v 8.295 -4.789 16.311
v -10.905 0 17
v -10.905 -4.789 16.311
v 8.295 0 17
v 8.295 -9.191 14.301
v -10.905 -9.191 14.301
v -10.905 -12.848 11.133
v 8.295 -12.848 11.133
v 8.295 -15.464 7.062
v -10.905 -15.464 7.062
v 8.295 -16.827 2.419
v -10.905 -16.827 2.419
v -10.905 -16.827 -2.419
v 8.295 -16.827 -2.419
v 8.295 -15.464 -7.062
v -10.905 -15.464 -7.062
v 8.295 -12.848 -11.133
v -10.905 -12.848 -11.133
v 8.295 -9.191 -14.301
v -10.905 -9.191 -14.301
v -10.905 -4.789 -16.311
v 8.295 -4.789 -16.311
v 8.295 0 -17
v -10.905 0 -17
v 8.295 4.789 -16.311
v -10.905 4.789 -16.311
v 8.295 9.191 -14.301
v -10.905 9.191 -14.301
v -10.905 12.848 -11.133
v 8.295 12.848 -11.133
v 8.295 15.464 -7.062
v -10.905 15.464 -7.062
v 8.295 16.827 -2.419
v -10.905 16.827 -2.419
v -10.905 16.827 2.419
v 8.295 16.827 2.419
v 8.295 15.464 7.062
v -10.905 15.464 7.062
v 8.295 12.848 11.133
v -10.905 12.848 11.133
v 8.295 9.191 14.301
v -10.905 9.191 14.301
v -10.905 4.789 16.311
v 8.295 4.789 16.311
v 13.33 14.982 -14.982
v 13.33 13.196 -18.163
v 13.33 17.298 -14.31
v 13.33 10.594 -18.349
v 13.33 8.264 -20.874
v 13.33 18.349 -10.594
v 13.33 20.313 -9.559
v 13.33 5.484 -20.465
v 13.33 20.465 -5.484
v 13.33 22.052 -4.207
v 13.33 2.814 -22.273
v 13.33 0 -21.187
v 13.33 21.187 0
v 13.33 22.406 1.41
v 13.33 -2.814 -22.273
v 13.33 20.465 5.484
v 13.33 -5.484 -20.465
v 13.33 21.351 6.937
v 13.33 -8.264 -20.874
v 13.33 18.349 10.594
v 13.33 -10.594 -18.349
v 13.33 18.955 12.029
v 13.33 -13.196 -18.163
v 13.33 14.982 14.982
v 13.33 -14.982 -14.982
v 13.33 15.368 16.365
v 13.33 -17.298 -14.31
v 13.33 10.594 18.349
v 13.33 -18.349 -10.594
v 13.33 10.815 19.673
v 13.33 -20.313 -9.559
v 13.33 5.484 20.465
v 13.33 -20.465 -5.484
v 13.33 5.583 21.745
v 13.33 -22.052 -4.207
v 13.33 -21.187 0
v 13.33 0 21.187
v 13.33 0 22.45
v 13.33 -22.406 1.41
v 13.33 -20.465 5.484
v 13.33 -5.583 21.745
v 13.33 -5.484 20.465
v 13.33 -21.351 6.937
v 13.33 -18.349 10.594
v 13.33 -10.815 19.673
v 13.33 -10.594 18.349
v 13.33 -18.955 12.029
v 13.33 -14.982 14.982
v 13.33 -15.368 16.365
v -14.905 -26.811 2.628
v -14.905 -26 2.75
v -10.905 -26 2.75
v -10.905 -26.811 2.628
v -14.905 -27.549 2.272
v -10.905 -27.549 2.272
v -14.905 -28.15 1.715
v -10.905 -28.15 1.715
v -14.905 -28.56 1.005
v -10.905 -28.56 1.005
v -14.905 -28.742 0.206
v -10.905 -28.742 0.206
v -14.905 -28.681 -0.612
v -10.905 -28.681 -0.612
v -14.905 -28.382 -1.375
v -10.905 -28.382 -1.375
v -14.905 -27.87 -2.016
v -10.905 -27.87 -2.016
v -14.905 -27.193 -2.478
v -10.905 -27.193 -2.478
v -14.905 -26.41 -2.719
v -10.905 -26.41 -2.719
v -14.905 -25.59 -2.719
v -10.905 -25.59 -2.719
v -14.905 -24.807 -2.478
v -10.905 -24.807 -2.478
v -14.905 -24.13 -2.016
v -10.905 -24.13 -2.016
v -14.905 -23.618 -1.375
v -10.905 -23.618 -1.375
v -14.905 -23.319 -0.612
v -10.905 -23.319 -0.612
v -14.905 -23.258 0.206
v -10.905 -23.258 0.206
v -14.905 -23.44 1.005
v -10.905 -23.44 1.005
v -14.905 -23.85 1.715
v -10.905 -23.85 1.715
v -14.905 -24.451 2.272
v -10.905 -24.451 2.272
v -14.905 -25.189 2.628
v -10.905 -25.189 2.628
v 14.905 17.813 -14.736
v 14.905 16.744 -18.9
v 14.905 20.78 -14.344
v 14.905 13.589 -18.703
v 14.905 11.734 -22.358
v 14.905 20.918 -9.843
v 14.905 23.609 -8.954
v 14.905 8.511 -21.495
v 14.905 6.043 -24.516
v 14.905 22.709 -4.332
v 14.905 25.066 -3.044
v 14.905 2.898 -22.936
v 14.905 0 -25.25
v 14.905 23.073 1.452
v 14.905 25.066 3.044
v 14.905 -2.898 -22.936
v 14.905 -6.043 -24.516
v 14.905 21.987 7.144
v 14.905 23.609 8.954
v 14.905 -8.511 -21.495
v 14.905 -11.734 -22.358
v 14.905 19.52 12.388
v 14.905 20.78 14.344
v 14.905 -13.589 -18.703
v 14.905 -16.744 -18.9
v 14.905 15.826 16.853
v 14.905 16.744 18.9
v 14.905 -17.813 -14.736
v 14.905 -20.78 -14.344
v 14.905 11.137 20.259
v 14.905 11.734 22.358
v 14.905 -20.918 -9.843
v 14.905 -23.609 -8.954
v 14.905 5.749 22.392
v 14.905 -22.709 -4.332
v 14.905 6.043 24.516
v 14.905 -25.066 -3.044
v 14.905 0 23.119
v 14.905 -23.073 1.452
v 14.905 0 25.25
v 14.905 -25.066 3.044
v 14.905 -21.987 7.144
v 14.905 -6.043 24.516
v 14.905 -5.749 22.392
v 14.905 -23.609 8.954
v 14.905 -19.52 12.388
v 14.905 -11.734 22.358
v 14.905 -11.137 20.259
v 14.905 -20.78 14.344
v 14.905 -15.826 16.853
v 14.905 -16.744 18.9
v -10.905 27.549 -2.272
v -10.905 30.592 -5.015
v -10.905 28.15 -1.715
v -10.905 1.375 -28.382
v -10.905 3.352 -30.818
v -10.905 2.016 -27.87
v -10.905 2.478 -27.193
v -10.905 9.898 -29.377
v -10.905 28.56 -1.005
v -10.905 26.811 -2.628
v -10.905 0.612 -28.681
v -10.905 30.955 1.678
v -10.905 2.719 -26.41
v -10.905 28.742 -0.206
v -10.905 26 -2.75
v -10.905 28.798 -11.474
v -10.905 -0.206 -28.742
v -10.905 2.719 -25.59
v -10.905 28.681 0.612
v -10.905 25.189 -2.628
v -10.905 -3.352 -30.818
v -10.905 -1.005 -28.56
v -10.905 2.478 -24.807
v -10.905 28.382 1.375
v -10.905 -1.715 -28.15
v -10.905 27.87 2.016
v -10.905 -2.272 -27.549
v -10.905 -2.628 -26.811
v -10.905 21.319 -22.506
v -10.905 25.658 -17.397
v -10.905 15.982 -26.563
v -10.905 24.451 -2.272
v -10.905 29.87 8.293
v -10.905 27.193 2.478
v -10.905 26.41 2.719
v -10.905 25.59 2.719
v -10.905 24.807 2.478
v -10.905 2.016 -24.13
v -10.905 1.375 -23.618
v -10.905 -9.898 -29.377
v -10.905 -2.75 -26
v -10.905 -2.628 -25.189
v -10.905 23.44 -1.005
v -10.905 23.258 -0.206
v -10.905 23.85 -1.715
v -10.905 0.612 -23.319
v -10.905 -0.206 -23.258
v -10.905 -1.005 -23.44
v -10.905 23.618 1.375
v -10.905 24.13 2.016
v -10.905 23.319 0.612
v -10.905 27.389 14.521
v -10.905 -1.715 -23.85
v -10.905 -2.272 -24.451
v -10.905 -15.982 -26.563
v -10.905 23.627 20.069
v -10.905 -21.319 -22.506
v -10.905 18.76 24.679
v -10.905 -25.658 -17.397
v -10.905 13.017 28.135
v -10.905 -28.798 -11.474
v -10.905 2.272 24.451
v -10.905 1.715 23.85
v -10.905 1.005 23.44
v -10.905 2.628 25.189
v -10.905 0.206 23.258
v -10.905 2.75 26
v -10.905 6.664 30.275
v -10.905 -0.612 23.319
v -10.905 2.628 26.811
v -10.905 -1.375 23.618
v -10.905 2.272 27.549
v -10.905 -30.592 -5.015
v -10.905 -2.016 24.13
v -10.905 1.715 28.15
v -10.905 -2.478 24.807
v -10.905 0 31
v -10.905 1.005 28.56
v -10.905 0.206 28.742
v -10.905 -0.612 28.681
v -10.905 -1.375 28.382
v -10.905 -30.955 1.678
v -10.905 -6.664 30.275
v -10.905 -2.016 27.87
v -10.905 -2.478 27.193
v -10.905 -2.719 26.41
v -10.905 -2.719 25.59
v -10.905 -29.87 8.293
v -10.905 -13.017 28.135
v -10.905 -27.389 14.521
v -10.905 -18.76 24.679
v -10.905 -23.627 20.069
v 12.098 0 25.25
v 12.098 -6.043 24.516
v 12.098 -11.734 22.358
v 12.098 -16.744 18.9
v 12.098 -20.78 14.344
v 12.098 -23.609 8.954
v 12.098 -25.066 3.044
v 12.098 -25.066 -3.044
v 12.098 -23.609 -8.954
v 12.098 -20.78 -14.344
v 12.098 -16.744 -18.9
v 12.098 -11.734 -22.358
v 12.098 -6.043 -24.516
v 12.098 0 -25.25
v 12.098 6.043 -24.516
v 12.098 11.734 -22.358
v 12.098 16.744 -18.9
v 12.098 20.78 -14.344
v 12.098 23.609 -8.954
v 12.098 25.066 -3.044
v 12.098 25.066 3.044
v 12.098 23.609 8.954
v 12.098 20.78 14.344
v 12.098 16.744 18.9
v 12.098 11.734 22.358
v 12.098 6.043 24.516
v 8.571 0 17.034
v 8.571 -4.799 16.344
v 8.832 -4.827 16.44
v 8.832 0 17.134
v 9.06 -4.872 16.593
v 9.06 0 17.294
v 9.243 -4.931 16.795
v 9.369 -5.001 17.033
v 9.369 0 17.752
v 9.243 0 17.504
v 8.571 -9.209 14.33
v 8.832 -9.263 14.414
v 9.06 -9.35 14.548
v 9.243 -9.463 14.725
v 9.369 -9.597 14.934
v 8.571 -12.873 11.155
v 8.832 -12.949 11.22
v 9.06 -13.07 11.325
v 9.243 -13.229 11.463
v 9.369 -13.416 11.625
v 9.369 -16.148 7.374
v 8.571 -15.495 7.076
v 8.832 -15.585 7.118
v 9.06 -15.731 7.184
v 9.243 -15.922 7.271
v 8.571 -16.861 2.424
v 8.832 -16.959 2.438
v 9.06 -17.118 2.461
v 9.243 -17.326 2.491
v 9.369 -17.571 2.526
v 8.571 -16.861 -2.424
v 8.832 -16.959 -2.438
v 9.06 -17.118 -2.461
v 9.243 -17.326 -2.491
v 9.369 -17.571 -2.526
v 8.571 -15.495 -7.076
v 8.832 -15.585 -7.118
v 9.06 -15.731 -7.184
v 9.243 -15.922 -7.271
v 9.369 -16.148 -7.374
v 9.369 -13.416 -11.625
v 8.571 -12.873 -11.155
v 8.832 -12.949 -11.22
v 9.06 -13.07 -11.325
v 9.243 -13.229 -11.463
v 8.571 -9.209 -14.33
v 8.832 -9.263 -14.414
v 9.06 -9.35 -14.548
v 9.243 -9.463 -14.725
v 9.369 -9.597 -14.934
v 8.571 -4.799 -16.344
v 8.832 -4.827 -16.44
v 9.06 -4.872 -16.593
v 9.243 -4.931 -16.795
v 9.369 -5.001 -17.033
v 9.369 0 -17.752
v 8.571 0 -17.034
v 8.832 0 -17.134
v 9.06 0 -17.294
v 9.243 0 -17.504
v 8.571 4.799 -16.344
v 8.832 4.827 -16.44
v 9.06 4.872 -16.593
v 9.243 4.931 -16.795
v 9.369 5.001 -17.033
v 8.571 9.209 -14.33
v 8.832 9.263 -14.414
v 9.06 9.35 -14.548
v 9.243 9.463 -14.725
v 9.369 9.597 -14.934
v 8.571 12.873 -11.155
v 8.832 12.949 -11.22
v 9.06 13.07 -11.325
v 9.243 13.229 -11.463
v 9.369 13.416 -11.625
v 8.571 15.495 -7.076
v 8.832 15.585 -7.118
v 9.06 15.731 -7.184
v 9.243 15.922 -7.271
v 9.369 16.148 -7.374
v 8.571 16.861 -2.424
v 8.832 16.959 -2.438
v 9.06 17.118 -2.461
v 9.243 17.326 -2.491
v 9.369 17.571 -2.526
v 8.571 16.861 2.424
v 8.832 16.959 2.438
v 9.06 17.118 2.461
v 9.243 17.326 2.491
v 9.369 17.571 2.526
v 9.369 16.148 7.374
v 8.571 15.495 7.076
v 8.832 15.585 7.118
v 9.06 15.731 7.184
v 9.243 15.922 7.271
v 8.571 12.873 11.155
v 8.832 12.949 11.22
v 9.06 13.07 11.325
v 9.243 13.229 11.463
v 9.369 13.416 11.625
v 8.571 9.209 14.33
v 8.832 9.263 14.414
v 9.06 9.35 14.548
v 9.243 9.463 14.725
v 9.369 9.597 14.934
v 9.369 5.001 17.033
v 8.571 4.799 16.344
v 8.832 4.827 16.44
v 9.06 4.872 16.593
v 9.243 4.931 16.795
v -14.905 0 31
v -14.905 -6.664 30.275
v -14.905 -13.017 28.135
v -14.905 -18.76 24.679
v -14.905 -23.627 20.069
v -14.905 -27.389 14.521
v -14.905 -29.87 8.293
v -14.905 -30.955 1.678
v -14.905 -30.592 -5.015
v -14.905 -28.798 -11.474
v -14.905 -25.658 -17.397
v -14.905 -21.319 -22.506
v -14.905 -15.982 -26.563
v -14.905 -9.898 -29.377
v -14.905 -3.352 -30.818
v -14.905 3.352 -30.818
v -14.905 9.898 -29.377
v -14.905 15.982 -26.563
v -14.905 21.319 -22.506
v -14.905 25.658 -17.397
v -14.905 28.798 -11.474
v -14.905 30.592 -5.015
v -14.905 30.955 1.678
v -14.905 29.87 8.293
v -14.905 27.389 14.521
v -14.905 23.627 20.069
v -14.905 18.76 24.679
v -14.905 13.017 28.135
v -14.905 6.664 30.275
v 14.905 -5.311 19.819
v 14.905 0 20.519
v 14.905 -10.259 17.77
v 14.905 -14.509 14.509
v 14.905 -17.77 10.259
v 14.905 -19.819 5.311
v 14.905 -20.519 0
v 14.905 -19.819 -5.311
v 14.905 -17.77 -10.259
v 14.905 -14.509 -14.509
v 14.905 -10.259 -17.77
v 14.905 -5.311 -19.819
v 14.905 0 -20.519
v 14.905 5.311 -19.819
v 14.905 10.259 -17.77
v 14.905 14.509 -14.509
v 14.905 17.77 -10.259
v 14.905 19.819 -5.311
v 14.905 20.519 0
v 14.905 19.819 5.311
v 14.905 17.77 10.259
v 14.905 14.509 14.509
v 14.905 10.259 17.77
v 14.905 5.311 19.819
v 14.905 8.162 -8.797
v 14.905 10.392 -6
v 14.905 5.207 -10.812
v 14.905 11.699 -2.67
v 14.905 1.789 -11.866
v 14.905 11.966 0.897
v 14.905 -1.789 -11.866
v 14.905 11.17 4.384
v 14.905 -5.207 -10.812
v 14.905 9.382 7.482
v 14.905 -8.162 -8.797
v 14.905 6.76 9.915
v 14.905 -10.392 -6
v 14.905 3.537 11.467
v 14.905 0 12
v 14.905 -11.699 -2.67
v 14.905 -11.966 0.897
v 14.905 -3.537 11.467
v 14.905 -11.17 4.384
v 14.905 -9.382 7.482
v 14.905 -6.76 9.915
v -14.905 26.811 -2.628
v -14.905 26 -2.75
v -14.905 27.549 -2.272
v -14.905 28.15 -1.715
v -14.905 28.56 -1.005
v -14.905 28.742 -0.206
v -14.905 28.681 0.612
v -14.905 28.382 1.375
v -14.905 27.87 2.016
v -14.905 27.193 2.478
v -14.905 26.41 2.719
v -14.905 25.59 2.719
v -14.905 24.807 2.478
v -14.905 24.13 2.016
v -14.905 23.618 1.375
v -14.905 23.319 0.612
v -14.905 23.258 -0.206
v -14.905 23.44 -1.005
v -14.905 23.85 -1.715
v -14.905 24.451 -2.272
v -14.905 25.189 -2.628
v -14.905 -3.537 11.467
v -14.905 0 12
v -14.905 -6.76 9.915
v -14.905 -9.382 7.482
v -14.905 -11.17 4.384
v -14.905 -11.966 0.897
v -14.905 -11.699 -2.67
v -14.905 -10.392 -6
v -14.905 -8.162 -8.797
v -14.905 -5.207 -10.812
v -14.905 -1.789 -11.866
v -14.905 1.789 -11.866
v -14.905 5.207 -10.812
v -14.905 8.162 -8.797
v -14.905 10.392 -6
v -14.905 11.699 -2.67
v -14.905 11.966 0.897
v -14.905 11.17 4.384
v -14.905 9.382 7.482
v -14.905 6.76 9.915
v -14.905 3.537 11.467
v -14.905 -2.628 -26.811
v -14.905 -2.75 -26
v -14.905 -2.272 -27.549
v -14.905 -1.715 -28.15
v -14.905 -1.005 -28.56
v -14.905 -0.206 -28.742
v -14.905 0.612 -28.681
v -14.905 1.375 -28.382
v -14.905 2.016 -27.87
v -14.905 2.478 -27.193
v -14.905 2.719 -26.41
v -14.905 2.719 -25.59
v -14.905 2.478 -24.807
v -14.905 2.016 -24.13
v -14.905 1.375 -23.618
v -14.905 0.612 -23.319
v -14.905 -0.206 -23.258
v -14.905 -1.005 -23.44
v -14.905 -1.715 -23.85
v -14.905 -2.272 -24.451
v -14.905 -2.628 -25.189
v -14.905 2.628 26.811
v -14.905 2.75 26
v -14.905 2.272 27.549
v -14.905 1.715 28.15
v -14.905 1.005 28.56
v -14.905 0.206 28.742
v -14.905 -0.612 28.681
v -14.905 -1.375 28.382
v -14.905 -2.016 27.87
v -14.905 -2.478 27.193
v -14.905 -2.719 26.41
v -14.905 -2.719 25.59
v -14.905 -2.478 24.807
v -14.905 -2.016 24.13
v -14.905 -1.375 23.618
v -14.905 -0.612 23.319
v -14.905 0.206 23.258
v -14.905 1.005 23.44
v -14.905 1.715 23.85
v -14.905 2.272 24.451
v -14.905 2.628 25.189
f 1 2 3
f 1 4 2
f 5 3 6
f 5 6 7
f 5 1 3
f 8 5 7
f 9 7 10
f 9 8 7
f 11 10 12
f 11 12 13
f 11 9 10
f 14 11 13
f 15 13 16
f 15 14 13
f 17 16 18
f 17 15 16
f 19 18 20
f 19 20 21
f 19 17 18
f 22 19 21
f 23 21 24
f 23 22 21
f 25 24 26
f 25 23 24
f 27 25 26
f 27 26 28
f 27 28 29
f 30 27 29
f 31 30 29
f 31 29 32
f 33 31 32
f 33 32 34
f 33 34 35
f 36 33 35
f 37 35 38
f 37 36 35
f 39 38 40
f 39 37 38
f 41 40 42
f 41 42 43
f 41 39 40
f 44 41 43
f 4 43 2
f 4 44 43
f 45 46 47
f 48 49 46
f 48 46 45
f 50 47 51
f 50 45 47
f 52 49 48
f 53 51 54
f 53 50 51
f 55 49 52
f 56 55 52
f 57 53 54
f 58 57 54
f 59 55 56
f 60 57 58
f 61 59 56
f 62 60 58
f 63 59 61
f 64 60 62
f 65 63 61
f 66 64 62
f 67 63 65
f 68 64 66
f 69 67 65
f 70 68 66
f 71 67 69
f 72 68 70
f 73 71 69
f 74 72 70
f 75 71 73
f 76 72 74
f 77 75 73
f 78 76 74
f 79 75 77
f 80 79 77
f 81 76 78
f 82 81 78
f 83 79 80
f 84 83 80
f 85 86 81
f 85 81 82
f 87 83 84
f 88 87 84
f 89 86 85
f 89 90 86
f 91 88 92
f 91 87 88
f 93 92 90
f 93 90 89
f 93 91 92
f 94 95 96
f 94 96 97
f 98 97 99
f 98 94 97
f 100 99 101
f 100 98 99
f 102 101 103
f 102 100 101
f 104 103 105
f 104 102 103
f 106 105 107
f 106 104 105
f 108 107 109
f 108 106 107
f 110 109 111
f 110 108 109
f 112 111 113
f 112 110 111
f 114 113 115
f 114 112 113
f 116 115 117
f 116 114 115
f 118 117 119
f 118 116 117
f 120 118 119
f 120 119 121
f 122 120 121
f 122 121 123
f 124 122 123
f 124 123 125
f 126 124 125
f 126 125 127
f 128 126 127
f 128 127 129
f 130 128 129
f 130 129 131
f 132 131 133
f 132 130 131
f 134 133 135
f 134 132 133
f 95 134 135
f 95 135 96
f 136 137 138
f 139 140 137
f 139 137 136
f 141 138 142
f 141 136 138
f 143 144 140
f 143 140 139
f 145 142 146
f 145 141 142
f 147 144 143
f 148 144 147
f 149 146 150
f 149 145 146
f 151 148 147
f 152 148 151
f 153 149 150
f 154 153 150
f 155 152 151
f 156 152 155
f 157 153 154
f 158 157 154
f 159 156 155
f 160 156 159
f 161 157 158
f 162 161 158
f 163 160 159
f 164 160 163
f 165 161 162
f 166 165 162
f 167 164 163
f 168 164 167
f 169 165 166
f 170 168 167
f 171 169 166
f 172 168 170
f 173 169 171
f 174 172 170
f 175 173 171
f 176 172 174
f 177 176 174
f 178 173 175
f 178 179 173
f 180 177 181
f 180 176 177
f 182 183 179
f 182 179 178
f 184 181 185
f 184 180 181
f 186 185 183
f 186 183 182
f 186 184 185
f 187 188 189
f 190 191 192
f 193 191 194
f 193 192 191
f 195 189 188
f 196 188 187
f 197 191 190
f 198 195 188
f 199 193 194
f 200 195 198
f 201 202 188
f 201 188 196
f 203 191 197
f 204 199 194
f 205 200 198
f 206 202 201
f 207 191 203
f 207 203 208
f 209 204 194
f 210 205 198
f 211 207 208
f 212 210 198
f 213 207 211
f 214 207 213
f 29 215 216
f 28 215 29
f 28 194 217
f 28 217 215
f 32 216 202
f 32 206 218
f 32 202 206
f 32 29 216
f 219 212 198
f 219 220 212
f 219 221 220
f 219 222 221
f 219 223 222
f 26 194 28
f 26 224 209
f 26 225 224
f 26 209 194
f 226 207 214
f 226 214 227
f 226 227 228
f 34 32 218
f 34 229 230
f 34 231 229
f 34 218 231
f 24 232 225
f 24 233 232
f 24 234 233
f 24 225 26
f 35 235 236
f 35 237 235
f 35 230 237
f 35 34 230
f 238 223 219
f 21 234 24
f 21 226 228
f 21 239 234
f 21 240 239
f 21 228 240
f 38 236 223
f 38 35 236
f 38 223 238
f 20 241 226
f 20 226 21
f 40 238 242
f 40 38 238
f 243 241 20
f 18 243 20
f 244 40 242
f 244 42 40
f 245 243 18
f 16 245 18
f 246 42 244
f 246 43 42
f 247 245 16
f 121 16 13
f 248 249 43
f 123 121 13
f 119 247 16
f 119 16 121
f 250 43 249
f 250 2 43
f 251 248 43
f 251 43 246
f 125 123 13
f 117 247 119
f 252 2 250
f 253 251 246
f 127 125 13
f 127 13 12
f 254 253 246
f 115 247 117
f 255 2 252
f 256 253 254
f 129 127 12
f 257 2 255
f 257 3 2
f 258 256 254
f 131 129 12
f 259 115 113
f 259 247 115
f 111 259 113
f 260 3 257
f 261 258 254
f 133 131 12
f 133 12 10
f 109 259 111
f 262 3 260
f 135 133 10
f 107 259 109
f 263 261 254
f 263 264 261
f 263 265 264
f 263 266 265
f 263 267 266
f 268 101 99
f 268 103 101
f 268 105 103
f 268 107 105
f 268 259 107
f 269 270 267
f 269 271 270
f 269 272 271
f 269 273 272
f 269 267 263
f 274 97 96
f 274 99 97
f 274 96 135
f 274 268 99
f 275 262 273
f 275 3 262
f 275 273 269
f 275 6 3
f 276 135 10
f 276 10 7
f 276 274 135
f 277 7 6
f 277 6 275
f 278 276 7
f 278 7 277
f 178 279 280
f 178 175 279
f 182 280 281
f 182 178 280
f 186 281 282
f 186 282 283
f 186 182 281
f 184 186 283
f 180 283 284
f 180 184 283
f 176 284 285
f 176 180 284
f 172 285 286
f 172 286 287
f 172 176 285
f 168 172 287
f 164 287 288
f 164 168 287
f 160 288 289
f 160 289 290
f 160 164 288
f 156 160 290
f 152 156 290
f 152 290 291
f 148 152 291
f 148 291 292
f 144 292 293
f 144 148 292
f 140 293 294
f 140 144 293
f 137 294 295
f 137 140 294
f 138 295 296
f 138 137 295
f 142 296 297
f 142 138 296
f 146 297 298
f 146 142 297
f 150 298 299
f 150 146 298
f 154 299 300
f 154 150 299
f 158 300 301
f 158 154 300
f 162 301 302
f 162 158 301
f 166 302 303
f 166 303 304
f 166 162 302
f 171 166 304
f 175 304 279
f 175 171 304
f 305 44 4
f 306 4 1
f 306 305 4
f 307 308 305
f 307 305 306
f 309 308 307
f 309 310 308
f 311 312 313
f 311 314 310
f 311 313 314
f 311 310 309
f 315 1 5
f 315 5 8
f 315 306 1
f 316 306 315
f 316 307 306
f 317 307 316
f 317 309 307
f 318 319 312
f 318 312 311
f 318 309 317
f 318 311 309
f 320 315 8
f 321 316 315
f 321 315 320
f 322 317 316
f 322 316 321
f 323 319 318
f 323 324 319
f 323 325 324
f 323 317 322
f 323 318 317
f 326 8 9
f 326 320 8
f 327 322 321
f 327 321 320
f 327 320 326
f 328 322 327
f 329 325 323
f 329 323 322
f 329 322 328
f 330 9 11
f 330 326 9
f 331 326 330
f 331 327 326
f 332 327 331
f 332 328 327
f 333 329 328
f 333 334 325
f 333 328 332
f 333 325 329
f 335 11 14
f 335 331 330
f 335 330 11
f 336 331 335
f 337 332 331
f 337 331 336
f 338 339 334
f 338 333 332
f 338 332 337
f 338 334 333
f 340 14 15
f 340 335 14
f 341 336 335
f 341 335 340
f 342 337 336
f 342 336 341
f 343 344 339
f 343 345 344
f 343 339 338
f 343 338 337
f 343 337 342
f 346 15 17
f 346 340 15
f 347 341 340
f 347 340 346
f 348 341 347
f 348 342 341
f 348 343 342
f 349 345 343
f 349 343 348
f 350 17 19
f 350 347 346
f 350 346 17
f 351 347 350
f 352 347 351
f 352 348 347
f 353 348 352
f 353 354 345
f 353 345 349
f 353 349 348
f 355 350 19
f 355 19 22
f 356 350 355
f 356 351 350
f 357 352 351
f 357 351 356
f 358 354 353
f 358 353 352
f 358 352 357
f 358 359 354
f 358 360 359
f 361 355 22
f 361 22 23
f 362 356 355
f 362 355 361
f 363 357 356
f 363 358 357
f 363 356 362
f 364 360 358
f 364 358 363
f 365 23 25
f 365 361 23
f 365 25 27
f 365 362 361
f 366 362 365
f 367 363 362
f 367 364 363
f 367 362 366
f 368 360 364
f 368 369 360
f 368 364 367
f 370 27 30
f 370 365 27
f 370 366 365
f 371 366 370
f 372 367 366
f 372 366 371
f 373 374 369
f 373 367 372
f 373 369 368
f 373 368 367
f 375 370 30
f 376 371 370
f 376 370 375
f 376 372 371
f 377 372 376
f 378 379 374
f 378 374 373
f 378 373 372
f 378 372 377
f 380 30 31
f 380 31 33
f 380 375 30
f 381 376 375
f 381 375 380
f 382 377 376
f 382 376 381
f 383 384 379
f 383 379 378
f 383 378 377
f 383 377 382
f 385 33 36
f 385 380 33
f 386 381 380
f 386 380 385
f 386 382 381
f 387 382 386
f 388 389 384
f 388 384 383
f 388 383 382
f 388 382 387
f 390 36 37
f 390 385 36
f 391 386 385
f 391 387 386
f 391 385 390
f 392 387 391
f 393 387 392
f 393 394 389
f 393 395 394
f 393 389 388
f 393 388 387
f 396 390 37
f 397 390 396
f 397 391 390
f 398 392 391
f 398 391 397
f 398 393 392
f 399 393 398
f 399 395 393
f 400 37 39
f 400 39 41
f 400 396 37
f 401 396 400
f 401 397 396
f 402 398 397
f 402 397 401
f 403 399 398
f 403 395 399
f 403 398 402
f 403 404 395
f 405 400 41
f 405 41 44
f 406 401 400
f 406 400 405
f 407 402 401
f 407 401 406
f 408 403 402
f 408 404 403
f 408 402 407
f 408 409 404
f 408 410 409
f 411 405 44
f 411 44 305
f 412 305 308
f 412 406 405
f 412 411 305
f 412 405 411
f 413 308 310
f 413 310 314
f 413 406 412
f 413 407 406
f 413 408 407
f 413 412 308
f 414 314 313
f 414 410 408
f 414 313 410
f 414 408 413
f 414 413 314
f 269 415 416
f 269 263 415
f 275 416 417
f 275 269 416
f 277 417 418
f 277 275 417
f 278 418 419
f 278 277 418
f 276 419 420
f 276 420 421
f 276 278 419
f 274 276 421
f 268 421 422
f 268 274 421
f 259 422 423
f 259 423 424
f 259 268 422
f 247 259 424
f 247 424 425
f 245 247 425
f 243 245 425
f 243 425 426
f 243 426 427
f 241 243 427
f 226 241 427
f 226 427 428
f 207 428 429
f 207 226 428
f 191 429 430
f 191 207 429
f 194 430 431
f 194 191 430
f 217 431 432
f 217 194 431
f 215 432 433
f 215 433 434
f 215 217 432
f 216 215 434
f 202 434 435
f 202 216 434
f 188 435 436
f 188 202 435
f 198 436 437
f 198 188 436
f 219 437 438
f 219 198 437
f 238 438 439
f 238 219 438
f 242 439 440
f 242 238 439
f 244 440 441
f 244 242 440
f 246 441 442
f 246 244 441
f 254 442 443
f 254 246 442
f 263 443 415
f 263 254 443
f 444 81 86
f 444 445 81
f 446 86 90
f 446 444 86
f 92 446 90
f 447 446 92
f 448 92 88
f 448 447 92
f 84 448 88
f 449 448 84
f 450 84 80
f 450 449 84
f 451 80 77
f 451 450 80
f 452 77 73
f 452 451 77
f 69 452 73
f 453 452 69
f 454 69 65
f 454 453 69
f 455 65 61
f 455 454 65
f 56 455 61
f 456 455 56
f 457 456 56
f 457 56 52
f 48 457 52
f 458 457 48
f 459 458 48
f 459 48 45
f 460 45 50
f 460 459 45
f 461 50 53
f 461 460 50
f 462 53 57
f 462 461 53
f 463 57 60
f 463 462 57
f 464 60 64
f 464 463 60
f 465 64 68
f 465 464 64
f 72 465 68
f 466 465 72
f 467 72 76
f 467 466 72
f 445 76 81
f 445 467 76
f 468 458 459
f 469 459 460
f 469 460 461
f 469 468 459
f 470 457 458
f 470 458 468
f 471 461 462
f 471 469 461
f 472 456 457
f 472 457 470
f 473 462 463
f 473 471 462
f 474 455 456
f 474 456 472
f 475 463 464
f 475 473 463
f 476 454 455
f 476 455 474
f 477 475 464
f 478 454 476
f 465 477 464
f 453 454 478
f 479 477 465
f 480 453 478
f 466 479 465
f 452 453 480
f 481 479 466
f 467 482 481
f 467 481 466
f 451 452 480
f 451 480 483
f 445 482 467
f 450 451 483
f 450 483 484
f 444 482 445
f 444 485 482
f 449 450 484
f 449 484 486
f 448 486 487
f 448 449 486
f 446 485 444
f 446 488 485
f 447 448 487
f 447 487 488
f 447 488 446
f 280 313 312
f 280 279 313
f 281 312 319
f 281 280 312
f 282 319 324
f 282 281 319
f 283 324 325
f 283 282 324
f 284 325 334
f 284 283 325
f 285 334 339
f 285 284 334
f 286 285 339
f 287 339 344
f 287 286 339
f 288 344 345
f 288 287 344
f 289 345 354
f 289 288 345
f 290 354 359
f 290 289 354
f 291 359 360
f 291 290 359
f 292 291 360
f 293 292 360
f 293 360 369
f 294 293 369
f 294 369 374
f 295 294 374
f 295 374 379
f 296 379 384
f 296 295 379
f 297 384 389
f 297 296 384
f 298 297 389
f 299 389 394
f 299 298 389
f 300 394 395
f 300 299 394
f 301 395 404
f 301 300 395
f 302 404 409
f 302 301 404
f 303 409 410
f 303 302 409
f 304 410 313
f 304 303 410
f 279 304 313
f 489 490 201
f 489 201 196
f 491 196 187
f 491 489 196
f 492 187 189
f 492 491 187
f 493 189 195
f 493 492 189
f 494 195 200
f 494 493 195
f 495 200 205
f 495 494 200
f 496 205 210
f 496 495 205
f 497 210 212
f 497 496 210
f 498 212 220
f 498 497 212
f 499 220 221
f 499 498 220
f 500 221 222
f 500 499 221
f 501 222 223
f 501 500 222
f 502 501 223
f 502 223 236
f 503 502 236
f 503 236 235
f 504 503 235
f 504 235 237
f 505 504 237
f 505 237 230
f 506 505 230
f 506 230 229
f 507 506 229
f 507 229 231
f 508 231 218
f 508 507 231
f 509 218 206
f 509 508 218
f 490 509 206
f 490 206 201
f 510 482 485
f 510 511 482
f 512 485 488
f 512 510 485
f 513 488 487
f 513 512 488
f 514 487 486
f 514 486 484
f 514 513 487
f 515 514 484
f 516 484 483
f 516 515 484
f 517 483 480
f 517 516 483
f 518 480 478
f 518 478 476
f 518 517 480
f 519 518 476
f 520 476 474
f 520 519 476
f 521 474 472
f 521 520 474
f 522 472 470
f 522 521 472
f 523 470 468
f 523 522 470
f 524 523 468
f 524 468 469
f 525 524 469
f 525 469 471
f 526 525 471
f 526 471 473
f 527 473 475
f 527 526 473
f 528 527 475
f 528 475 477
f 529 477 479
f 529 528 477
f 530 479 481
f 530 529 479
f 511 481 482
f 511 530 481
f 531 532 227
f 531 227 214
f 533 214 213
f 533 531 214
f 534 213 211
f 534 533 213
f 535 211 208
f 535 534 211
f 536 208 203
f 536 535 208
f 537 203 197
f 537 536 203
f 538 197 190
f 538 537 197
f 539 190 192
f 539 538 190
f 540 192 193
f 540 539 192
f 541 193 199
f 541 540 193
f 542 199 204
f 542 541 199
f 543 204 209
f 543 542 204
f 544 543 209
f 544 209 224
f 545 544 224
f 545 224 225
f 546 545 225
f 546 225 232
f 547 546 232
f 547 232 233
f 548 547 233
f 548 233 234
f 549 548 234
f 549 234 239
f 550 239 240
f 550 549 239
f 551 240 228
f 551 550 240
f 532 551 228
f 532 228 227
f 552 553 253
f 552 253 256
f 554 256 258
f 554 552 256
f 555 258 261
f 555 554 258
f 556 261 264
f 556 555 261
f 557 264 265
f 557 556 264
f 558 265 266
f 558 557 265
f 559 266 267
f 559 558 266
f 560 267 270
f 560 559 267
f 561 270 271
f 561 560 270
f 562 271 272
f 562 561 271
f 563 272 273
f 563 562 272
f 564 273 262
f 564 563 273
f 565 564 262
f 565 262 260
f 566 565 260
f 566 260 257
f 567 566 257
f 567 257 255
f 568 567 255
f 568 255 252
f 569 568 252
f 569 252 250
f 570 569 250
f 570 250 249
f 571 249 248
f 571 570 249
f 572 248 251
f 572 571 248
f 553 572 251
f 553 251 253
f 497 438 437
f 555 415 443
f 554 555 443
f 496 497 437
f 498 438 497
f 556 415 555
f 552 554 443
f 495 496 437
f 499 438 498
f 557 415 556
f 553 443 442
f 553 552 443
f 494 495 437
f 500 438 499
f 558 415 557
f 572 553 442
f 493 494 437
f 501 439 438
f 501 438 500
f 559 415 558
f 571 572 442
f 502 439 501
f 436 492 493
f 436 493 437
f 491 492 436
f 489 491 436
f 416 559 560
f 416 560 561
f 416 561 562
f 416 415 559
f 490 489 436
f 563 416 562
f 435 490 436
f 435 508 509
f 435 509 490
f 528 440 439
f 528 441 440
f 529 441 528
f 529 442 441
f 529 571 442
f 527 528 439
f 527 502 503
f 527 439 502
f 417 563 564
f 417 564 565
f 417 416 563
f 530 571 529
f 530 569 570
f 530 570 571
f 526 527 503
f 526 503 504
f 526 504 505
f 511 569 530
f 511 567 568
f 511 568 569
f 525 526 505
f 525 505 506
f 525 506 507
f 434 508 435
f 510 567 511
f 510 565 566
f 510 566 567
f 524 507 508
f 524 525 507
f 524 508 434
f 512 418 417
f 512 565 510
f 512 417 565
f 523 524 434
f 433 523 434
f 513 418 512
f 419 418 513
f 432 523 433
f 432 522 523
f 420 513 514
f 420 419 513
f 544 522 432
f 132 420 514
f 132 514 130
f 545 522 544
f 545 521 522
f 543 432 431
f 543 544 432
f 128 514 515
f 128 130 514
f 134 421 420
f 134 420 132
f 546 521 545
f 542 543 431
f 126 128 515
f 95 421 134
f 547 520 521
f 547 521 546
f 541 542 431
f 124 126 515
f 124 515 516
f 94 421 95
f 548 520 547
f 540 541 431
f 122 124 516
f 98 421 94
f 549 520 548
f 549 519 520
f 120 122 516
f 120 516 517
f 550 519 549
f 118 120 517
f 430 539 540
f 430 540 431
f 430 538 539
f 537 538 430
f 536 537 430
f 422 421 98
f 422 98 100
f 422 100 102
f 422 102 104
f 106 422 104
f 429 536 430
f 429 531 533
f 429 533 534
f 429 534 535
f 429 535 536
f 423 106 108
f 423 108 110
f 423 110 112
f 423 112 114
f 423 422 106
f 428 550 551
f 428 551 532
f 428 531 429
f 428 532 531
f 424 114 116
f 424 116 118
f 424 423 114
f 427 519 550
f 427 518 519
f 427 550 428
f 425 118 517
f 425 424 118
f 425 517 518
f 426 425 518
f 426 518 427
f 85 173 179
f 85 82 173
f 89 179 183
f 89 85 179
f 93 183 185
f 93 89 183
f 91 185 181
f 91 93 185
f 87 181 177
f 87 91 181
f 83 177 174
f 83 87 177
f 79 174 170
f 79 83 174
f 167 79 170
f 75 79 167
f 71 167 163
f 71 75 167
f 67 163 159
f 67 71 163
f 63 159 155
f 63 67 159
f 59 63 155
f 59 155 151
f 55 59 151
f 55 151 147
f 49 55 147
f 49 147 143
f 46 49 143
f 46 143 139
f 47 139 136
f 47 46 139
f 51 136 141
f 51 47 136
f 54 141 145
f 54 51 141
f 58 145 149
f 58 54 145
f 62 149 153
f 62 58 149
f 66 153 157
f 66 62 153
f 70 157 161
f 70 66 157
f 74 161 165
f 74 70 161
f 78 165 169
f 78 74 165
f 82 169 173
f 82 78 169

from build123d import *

# Parameters (mm, degrees)
M5_START                     = -14.904727216
M5_CLEARANCE_HOLE1_OUTLINE_R = 2.75
M5_CLEARANCE_HOLE1_DEPTH     = 4
CIRPATTERN1_COUNT            = 4


# Read off the part's stored shape, not the designer's step: M5 Clearance Hole1
with BuildPart() as part:
    # Sketch1 → Revolve1 (revolve)
    with BuildSketch(Plane.XY, mode=Mode.PRIVATE) as revolve1_sk:
        with BuildLine():
            Line((-14.904727216, 12), (-14.904727216, 31))
            Line((-14.904727216, 31), (-10.904727216, 31))
            Line((-10.904727216, 31), (-10.904727216, 17))
            Line((-10.904727216, 17), (8.294935567, 17))
            ThreePointArc((8.294935567, 17), (8.950533434, 17.206709213), (9.369004233, 17.752070976))
            Line((9.369004233, 17.752070976), (12.098027216, 25.25))
            Line((12.098027216, 25.25), (14.904727216, 25.25))
            Line((14.904727216, 25.25), (14.904727216, 23.1186))
            Line((14.904727216, 23.1186), (13.329927216, 22.450137059))
            Line((13.329927216, 22.450137059), (13.329927216, 21.187062941))
            Line((13.329927216, 21.187062941), (14.904727216, 20.5186))
            Line((14.904727216, 20.5186), (14.904727216, 12))
            Line((14.904727216, 12), (-14.904727216, 12))
        make_face()
    revolve(revolve1_sk.sketch.rotate(Axis((0, 0, 0), (1, 0, 0)), 90), axis=Axis((0, 0, 0), (1, 0, 0)))

    # M5 Clearance Hole1 outline → M5 Clearance Hole1 (cut)
    with BuildSketch(Plane.YZ.offset(M5_START)):
        with Locations((0, 26)):
            Circle(M5_CLEARANCE_HOLE1_OUTLINE_R)
    m5_clearance_hole1 = extrude(amount=M5_CLEARANCE_HOLE1_DEPTH, mode=Mode.SUBTRACT)

    # CirPattern1: M5 Clearance Hole1 ×4 about axis
    cirpattern1_axis = Axis((0, 0, 0), (1, 0, 0))
    for i in range(1, CIRPATTERN1_COUNT):
        add(m5_clearance_hole1.rotate(cirpattern1_axis, i * 360 / CIRPATTERN1_COUNT), mode=Mode.SUBTRACT)


solid = part.part
